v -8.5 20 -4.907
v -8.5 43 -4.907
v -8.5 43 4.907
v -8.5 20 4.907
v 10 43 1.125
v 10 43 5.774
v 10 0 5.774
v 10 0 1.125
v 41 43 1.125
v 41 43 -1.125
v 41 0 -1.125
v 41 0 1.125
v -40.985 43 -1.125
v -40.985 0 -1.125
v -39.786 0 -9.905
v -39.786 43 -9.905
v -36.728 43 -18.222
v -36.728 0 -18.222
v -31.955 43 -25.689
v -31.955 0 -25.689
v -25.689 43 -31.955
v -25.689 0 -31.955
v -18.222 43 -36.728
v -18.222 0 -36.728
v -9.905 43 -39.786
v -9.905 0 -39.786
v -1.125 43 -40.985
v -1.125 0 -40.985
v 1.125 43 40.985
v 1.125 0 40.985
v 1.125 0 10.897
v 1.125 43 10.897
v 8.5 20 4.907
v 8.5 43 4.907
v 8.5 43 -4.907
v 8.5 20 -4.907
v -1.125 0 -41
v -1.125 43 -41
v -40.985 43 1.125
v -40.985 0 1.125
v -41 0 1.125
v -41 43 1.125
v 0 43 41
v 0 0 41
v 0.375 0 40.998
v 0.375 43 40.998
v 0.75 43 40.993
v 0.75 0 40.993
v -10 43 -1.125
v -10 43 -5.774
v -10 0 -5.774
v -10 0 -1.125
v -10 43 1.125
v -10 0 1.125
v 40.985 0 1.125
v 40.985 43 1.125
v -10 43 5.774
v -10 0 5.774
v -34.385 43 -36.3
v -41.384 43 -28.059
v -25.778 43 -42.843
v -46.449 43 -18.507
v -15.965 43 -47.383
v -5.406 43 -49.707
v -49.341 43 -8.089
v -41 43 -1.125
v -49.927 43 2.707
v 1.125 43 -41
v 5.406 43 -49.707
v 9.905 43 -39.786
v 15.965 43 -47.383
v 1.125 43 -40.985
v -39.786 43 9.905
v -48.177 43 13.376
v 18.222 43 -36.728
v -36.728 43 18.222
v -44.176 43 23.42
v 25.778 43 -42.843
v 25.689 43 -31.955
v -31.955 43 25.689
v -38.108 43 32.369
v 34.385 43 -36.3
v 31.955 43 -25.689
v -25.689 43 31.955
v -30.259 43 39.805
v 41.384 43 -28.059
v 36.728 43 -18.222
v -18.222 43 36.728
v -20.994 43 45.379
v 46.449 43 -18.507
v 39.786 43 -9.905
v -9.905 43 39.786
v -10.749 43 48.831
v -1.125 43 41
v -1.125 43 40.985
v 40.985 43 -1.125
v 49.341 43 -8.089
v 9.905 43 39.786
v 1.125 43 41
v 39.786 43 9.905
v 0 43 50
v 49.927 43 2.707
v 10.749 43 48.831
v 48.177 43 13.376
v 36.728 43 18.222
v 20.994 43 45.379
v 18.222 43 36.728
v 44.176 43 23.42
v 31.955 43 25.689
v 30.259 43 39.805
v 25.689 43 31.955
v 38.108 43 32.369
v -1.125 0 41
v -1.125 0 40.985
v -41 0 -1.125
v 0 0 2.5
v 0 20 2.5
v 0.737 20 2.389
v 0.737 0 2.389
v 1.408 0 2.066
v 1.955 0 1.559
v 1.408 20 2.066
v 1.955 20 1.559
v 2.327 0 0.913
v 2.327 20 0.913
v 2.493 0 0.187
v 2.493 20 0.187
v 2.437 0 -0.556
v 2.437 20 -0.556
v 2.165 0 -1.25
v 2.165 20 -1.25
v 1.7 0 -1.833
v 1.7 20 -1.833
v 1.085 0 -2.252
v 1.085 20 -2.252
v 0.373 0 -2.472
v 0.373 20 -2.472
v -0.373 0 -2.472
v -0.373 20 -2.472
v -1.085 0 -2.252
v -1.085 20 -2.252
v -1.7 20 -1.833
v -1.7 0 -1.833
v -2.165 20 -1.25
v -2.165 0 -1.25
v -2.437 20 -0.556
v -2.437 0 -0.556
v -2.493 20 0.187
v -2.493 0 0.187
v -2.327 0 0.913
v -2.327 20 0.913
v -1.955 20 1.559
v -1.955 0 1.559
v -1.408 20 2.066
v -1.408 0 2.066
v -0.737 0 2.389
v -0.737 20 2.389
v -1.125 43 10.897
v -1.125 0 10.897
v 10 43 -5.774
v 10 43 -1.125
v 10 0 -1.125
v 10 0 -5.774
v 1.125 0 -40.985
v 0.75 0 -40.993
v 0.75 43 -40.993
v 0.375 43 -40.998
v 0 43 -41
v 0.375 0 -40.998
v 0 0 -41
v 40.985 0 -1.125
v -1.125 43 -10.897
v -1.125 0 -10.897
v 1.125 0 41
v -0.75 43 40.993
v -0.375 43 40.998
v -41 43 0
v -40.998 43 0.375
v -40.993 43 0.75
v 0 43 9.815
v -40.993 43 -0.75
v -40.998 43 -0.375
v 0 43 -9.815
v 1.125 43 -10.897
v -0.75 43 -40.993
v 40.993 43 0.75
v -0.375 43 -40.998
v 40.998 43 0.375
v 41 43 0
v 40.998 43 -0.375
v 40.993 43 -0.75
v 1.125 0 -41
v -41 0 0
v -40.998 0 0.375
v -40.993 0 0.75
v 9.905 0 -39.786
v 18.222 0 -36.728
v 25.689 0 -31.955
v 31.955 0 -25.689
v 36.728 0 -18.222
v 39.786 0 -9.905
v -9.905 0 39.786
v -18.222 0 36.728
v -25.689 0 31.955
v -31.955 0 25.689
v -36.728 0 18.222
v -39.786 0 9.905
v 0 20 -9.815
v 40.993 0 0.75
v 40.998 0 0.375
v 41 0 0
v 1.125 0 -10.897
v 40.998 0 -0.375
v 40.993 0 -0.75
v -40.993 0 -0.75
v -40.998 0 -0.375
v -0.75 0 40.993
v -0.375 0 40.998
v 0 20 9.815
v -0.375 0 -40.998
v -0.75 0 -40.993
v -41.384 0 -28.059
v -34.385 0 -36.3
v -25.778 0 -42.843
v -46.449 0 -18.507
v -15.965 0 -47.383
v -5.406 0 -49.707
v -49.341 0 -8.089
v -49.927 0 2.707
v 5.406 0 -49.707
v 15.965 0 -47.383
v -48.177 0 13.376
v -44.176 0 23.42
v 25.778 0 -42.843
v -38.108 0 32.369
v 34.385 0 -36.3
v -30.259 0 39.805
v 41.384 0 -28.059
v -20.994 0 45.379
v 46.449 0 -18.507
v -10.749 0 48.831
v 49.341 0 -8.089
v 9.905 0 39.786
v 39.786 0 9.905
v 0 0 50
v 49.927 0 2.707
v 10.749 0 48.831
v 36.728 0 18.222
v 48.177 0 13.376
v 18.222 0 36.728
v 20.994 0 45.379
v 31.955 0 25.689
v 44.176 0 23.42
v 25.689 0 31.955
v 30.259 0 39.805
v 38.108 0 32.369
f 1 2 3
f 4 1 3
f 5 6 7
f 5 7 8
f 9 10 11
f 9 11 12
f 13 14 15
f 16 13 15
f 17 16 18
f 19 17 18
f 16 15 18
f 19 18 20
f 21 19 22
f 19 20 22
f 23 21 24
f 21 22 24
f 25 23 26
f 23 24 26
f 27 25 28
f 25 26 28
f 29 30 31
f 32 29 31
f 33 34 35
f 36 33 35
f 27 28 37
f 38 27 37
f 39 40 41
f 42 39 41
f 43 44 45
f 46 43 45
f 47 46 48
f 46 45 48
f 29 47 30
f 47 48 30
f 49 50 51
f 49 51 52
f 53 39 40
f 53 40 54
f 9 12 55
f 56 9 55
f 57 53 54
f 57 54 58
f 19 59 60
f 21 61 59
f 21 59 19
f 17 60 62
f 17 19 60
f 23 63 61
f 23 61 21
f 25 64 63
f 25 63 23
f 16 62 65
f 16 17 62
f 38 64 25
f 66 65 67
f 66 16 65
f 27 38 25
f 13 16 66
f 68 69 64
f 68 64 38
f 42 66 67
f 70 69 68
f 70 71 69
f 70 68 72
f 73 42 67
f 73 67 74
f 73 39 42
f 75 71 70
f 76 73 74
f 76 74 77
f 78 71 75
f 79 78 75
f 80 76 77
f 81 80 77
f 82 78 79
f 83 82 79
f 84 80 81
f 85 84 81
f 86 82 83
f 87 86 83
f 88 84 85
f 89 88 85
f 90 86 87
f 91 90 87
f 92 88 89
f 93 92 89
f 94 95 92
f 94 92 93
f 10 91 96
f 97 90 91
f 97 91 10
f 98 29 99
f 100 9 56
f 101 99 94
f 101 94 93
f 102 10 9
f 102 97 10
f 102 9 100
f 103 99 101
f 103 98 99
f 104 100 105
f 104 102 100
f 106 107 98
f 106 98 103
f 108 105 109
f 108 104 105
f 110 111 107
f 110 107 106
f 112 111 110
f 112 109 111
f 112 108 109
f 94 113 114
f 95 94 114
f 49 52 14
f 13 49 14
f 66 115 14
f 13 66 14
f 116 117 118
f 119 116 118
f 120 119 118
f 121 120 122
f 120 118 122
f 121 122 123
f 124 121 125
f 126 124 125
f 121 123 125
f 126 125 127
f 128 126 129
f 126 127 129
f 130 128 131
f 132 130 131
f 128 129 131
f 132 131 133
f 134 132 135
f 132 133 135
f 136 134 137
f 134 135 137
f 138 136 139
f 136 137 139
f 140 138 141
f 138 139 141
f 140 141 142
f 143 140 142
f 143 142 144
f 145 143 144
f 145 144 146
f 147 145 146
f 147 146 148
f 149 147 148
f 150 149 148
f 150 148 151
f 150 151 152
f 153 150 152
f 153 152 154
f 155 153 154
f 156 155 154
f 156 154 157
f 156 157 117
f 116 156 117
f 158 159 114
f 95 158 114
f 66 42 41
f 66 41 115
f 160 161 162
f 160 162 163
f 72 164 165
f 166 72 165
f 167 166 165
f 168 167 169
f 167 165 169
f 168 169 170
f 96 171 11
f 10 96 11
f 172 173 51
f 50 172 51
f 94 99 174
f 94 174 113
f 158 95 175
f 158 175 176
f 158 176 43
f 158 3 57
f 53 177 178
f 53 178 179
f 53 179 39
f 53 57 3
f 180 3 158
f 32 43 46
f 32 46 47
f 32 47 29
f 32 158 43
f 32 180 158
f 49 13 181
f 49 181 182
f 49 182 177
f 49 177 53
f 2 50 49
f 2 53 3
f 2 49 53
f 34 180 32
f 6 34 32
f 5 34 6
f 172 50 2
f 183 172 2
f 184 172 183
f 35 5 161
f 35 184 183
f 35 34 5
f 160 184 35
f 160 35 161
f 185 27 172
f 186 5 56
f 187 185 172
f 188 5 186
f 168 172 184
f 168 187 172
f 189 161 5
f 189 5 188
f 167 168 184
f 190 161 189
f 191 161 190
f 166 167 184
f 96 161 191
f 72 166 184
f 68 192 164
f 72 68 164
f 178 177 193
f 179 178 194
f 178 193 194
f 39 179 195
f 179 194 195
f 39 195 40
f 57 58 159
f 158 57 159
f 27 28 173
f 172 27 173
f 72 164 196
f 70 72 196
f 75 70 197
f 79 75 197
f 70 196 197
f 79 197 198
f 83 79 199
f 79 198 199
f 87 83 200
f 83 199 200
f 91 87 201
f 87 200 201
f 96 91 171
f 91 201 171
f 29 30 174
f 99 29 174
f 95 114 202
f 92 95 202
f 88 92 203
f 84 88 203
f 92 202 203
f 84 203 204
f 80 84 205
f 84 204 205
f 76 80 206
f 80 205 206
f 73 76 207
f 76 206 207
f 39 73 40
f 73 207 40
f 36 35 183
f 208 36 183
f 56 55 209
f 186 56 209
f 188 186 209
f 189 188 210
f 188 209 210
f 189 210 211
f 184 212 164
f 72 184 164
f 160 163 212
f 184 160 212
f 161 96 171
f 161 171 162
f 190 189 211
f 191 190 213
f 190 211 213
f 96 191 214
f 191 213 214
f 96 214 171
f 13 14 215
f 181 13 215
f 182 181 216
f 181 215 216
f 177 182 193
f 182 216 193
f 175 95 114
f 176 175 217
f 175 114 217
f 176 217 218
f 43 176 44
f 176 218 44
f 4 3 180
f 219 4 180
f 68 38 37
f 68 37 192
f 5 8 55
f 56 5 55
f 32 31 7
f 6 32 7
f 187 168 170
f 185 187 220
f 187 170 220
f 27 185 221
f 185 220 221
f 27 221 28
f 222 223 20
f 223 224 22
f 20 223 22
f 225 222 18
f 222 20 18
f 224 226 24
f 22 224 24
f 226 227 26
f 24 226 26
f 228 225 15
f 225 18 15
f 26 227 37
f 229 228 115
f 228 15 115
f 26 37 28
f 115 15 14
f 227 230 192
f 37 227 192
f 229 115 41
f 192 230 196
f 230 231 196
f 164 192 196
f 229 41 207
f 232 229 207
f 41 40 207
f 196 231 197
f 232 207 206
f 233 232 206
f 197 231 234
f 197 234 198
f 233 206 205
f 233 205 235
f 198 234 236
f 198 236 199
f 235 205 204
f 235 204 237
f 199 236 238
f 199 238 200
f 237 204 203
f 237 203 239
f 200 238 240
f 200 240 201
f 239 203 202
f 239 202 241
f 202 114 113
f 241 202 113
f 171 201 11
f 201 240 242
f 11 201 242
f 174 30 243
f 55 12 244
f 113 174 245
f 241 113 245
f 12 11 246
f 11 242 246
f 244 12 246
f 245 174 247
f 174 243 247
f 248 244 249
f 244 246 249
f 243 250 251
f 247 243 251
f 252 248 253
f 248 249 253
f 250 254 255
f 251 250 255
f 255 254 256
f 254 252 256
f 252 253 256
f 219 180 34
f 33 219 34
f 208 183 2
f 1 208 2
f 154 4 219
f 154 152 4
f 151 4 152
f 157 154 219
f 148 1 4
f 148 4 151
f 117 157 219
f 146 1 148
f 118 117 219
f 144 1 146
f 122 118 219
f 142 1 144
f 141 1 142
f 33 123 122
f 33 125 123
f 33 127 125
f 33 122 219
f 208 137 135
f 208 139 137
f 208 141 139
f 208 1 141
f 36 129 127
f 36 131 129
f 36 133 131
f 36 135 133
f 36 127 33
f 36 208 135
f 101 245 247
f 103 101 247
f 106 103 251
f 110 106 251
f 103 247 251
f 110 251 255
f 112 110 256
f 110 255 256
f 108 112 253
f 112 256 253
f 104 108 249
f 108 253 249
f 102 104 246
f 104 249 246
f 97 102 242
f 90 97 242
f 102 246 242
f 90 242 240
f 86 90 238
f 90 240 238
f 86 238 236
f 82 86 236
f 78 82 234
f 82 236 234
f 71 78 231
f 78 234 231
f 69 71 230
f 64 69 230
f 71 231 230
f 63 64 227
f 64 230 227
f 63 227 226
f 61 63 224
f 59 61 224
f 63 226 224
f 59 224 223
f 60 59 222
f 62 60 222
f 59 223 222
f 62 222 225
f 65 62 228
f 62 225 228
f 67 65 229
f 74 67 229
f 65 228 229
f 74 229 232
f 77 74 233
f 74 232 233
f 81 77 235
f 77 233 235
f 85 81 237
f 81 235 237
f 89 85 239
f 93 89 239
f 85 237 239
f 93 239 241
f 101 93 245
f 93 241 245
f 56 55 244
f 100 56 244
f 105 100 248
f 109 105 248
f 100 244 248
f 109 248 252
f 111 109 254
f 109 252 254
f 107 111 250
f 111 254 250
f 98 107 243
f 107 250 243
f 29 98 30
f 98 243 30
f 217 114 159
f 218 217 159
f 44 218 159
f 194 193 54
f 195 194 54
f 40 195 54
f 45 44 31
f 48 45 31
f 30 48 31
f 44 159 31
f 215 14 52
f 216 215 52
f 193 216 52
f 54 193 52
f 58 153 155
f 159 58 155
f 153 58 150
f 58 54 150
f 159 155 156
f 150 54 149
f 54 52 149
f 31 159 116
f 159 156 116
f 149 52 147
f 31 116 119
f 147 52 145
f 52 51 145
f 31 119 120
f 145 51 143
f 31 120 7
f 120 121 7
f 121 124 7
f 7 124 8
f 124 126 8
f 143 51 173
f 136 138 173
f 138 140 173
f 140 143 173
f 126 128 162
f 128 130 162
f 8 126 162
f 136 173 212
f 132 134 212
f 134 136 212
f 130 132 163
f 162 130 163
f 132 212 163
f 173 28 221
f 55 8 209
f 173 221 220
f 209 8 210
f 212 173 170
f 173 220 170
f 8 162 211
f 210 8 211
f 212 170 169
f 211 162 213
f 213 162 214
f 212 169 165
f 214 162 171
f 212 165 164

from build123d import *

# Parameters (mm, degrees)
MAIN_WHEEL_DEPTH   = 43
SKETCH1_R          = 50
MAIN_WHEEL_2_DEPTH = 43
HEX_BORE_DEPTH     = 23
SKETCH3_R          = 2.5
MOTOR_BORE_DEPTH   = 75.35724578


with BuildPart() as part:
    # Sketch1 → main-wheel (new body)
    with BuildSketch(Plane(origin=(0, 0, 0), x_dir=(1, 0, 0), z_dir=(0, 1, 0))):
        with BuildLine():
            Line((-1.125, -10.897486331), (-1.125, -40.984562643))
            ThreePointArc((-1.125, -40.984562643), (-0.562552934, -40.996140479), (4.4e-08, -41))
            ThreePointArc((4.4e-08, -41), (0.562552978, -40.996140479), (1.125, -40.984562643))
            Line((1.125, -40.984562643), (1.125, -10.897486331))
            Line((1.125, -10.897486331), (10, -5.773502692))
            Line((10, -5.773502692), (10, -1.125))
            Line((10, -1.125), (40.984562643, -1.125))
            ThreePointArc((40.984562643, -1.125), (40.996140479, -0.562552956), (41, 0))
            ThreePointArc((41, 0), (40.996140479, 0.562552956), (40.984562643, 1.125))
            Line((40.984562643, 1.125), (10, 1.125))
            Line((10, 1.125), (10, 5.773502692))
            Line((10, 5.773502692), (1.125, 10.897486331))
            Line((1.125, 10.897486331), (1.125, 40.984562643))
            ThreePointArc((1.125, 40.984562643), (0.562552956, 40.996140479), (0, 41))
            ThreePointArc((0, 41), (-0.562552956, 40.996140479), (-1.125, 40.984562643))
            Line((-1.125, 40.984562643), (-1.125, 10.897486331))
            Line((-1.125, 10.897486331), (-10, 5.773502692))
            Line((-10, 5.773502692), (-10, 1.125))
            Line((-10, 1.125), (-40.984562643, 1.125))
            ThreePointArc((-40.984562643, 1.125), (-40.996140481, 0.562552814), (-41, -2.83e-07))
            ThreePointArc((-41, -2.83e-07), (-40.996140477, -0.562553097), (-40.984562643, -1.125))
            Line((-40.984562643, -1.125), (-10, -1.125))
            Line((-10, -1.125), (-10, -5.773502692))
            Line((-10, -5.773502692), (-1.125, -10.897486331))
        make_face()
    extrude(amount=MAIN_WHEEL_DEPTH)

    # Sketch2 → hex-bore (cut)
    with BuildSketch(Plane(origin=(0, 43, 0), x_dir=(1, 0, 0), z_dir=(0, 1, 0))):
        Polygon((0, -9.814954576), (8.5, -4.907477288), (8.5, 4.907477288), (0, 9.814954576), (-8.5, 4.907477288), (-8.5, -4.907477288), align=None)
    extrude(amount=-HEX_BORE_DEPTH, mode=Mode.SUBTRACT)

    # Sketch3 → motor-bore (cut, through all)
    with BuildSketch(Plane(origin=(0, 20, 0), x_dir=(1, 0, 0), z_dir=(0, 1, 0))):
        with Locations(Location((0, 0, 0), (0, 0, 270))):
            Circle(SKETCH3_R)
    extrude(amount=-MOTOR_BORE_DEPTH, mode=Mode.SUBTRACT)


with BuildPart() as body_2:
    # Sketch1 → main-wheel 2 (new body)
    with BuildSketch(Plane(origin=(0, 0, 0), x_dir=(1, 0, 0), z_dir=(0, 1, 0))):
        with Locations(Location((0, 0, 0), (0, 0, 270))):
            Circle(SKETCH1_R)
        with BuildLine():
            Line((4.4e-08, -41), (-1.125, -41))
            Line((-1.125, -41), (-1.125, -40.984562643))
            ThreePointArc((-1.125, -40.984562643), (-28.991378029, -28.991378029), (-40.984562643, -1.125))
            Line((-40.984562643, -1.125), (-41, -1.125))
            Line((-41, -1.125), (-41, -2.83e-07))
            Line((-41, -2.83e-07), (-41, 1.125))
            Line((-41, 1.125), (-40.984562643, 1.125))
            ThreePointArc((-40.984562643, 1.125), (-28.991378029, 28.991378029), (-1.125, 40.984562643))
            Line((-1.125, 40.984562643), (-1.125, 41))
            Line((-1.125, 41), (0, 41))
            Line((0, 41), (1.125, 41))
            Line((1.125, 41), (1.125, 40.984562643))
            ThreePointArc((1.125, 40.984562643), (28.991378029, 28.991378029), (40.984562643, 1.125))
            Line((40.984562643, 1.125), (41, 1.125))
            Line((41, 1.125), (41, 0))
            Line((41, 0), (41, -1.125))
            Line((41, -1.125), (40.984562643, -1.125))
            ThreePointArc((40.984562643, -1.125), (28.991378029, -28.991378029), (1.125, -40.984562643))
            Line((1.125, -40.984562643), (1.125, -41))
            Line((1.125, -41), (4.4e-08, -41))
        make_face(mode=Mode.SUBTRACT)
    extrude(amount=MAIN_WHEEL_2_DEPTH)


solid = Compound([part.part, body_2.part])
